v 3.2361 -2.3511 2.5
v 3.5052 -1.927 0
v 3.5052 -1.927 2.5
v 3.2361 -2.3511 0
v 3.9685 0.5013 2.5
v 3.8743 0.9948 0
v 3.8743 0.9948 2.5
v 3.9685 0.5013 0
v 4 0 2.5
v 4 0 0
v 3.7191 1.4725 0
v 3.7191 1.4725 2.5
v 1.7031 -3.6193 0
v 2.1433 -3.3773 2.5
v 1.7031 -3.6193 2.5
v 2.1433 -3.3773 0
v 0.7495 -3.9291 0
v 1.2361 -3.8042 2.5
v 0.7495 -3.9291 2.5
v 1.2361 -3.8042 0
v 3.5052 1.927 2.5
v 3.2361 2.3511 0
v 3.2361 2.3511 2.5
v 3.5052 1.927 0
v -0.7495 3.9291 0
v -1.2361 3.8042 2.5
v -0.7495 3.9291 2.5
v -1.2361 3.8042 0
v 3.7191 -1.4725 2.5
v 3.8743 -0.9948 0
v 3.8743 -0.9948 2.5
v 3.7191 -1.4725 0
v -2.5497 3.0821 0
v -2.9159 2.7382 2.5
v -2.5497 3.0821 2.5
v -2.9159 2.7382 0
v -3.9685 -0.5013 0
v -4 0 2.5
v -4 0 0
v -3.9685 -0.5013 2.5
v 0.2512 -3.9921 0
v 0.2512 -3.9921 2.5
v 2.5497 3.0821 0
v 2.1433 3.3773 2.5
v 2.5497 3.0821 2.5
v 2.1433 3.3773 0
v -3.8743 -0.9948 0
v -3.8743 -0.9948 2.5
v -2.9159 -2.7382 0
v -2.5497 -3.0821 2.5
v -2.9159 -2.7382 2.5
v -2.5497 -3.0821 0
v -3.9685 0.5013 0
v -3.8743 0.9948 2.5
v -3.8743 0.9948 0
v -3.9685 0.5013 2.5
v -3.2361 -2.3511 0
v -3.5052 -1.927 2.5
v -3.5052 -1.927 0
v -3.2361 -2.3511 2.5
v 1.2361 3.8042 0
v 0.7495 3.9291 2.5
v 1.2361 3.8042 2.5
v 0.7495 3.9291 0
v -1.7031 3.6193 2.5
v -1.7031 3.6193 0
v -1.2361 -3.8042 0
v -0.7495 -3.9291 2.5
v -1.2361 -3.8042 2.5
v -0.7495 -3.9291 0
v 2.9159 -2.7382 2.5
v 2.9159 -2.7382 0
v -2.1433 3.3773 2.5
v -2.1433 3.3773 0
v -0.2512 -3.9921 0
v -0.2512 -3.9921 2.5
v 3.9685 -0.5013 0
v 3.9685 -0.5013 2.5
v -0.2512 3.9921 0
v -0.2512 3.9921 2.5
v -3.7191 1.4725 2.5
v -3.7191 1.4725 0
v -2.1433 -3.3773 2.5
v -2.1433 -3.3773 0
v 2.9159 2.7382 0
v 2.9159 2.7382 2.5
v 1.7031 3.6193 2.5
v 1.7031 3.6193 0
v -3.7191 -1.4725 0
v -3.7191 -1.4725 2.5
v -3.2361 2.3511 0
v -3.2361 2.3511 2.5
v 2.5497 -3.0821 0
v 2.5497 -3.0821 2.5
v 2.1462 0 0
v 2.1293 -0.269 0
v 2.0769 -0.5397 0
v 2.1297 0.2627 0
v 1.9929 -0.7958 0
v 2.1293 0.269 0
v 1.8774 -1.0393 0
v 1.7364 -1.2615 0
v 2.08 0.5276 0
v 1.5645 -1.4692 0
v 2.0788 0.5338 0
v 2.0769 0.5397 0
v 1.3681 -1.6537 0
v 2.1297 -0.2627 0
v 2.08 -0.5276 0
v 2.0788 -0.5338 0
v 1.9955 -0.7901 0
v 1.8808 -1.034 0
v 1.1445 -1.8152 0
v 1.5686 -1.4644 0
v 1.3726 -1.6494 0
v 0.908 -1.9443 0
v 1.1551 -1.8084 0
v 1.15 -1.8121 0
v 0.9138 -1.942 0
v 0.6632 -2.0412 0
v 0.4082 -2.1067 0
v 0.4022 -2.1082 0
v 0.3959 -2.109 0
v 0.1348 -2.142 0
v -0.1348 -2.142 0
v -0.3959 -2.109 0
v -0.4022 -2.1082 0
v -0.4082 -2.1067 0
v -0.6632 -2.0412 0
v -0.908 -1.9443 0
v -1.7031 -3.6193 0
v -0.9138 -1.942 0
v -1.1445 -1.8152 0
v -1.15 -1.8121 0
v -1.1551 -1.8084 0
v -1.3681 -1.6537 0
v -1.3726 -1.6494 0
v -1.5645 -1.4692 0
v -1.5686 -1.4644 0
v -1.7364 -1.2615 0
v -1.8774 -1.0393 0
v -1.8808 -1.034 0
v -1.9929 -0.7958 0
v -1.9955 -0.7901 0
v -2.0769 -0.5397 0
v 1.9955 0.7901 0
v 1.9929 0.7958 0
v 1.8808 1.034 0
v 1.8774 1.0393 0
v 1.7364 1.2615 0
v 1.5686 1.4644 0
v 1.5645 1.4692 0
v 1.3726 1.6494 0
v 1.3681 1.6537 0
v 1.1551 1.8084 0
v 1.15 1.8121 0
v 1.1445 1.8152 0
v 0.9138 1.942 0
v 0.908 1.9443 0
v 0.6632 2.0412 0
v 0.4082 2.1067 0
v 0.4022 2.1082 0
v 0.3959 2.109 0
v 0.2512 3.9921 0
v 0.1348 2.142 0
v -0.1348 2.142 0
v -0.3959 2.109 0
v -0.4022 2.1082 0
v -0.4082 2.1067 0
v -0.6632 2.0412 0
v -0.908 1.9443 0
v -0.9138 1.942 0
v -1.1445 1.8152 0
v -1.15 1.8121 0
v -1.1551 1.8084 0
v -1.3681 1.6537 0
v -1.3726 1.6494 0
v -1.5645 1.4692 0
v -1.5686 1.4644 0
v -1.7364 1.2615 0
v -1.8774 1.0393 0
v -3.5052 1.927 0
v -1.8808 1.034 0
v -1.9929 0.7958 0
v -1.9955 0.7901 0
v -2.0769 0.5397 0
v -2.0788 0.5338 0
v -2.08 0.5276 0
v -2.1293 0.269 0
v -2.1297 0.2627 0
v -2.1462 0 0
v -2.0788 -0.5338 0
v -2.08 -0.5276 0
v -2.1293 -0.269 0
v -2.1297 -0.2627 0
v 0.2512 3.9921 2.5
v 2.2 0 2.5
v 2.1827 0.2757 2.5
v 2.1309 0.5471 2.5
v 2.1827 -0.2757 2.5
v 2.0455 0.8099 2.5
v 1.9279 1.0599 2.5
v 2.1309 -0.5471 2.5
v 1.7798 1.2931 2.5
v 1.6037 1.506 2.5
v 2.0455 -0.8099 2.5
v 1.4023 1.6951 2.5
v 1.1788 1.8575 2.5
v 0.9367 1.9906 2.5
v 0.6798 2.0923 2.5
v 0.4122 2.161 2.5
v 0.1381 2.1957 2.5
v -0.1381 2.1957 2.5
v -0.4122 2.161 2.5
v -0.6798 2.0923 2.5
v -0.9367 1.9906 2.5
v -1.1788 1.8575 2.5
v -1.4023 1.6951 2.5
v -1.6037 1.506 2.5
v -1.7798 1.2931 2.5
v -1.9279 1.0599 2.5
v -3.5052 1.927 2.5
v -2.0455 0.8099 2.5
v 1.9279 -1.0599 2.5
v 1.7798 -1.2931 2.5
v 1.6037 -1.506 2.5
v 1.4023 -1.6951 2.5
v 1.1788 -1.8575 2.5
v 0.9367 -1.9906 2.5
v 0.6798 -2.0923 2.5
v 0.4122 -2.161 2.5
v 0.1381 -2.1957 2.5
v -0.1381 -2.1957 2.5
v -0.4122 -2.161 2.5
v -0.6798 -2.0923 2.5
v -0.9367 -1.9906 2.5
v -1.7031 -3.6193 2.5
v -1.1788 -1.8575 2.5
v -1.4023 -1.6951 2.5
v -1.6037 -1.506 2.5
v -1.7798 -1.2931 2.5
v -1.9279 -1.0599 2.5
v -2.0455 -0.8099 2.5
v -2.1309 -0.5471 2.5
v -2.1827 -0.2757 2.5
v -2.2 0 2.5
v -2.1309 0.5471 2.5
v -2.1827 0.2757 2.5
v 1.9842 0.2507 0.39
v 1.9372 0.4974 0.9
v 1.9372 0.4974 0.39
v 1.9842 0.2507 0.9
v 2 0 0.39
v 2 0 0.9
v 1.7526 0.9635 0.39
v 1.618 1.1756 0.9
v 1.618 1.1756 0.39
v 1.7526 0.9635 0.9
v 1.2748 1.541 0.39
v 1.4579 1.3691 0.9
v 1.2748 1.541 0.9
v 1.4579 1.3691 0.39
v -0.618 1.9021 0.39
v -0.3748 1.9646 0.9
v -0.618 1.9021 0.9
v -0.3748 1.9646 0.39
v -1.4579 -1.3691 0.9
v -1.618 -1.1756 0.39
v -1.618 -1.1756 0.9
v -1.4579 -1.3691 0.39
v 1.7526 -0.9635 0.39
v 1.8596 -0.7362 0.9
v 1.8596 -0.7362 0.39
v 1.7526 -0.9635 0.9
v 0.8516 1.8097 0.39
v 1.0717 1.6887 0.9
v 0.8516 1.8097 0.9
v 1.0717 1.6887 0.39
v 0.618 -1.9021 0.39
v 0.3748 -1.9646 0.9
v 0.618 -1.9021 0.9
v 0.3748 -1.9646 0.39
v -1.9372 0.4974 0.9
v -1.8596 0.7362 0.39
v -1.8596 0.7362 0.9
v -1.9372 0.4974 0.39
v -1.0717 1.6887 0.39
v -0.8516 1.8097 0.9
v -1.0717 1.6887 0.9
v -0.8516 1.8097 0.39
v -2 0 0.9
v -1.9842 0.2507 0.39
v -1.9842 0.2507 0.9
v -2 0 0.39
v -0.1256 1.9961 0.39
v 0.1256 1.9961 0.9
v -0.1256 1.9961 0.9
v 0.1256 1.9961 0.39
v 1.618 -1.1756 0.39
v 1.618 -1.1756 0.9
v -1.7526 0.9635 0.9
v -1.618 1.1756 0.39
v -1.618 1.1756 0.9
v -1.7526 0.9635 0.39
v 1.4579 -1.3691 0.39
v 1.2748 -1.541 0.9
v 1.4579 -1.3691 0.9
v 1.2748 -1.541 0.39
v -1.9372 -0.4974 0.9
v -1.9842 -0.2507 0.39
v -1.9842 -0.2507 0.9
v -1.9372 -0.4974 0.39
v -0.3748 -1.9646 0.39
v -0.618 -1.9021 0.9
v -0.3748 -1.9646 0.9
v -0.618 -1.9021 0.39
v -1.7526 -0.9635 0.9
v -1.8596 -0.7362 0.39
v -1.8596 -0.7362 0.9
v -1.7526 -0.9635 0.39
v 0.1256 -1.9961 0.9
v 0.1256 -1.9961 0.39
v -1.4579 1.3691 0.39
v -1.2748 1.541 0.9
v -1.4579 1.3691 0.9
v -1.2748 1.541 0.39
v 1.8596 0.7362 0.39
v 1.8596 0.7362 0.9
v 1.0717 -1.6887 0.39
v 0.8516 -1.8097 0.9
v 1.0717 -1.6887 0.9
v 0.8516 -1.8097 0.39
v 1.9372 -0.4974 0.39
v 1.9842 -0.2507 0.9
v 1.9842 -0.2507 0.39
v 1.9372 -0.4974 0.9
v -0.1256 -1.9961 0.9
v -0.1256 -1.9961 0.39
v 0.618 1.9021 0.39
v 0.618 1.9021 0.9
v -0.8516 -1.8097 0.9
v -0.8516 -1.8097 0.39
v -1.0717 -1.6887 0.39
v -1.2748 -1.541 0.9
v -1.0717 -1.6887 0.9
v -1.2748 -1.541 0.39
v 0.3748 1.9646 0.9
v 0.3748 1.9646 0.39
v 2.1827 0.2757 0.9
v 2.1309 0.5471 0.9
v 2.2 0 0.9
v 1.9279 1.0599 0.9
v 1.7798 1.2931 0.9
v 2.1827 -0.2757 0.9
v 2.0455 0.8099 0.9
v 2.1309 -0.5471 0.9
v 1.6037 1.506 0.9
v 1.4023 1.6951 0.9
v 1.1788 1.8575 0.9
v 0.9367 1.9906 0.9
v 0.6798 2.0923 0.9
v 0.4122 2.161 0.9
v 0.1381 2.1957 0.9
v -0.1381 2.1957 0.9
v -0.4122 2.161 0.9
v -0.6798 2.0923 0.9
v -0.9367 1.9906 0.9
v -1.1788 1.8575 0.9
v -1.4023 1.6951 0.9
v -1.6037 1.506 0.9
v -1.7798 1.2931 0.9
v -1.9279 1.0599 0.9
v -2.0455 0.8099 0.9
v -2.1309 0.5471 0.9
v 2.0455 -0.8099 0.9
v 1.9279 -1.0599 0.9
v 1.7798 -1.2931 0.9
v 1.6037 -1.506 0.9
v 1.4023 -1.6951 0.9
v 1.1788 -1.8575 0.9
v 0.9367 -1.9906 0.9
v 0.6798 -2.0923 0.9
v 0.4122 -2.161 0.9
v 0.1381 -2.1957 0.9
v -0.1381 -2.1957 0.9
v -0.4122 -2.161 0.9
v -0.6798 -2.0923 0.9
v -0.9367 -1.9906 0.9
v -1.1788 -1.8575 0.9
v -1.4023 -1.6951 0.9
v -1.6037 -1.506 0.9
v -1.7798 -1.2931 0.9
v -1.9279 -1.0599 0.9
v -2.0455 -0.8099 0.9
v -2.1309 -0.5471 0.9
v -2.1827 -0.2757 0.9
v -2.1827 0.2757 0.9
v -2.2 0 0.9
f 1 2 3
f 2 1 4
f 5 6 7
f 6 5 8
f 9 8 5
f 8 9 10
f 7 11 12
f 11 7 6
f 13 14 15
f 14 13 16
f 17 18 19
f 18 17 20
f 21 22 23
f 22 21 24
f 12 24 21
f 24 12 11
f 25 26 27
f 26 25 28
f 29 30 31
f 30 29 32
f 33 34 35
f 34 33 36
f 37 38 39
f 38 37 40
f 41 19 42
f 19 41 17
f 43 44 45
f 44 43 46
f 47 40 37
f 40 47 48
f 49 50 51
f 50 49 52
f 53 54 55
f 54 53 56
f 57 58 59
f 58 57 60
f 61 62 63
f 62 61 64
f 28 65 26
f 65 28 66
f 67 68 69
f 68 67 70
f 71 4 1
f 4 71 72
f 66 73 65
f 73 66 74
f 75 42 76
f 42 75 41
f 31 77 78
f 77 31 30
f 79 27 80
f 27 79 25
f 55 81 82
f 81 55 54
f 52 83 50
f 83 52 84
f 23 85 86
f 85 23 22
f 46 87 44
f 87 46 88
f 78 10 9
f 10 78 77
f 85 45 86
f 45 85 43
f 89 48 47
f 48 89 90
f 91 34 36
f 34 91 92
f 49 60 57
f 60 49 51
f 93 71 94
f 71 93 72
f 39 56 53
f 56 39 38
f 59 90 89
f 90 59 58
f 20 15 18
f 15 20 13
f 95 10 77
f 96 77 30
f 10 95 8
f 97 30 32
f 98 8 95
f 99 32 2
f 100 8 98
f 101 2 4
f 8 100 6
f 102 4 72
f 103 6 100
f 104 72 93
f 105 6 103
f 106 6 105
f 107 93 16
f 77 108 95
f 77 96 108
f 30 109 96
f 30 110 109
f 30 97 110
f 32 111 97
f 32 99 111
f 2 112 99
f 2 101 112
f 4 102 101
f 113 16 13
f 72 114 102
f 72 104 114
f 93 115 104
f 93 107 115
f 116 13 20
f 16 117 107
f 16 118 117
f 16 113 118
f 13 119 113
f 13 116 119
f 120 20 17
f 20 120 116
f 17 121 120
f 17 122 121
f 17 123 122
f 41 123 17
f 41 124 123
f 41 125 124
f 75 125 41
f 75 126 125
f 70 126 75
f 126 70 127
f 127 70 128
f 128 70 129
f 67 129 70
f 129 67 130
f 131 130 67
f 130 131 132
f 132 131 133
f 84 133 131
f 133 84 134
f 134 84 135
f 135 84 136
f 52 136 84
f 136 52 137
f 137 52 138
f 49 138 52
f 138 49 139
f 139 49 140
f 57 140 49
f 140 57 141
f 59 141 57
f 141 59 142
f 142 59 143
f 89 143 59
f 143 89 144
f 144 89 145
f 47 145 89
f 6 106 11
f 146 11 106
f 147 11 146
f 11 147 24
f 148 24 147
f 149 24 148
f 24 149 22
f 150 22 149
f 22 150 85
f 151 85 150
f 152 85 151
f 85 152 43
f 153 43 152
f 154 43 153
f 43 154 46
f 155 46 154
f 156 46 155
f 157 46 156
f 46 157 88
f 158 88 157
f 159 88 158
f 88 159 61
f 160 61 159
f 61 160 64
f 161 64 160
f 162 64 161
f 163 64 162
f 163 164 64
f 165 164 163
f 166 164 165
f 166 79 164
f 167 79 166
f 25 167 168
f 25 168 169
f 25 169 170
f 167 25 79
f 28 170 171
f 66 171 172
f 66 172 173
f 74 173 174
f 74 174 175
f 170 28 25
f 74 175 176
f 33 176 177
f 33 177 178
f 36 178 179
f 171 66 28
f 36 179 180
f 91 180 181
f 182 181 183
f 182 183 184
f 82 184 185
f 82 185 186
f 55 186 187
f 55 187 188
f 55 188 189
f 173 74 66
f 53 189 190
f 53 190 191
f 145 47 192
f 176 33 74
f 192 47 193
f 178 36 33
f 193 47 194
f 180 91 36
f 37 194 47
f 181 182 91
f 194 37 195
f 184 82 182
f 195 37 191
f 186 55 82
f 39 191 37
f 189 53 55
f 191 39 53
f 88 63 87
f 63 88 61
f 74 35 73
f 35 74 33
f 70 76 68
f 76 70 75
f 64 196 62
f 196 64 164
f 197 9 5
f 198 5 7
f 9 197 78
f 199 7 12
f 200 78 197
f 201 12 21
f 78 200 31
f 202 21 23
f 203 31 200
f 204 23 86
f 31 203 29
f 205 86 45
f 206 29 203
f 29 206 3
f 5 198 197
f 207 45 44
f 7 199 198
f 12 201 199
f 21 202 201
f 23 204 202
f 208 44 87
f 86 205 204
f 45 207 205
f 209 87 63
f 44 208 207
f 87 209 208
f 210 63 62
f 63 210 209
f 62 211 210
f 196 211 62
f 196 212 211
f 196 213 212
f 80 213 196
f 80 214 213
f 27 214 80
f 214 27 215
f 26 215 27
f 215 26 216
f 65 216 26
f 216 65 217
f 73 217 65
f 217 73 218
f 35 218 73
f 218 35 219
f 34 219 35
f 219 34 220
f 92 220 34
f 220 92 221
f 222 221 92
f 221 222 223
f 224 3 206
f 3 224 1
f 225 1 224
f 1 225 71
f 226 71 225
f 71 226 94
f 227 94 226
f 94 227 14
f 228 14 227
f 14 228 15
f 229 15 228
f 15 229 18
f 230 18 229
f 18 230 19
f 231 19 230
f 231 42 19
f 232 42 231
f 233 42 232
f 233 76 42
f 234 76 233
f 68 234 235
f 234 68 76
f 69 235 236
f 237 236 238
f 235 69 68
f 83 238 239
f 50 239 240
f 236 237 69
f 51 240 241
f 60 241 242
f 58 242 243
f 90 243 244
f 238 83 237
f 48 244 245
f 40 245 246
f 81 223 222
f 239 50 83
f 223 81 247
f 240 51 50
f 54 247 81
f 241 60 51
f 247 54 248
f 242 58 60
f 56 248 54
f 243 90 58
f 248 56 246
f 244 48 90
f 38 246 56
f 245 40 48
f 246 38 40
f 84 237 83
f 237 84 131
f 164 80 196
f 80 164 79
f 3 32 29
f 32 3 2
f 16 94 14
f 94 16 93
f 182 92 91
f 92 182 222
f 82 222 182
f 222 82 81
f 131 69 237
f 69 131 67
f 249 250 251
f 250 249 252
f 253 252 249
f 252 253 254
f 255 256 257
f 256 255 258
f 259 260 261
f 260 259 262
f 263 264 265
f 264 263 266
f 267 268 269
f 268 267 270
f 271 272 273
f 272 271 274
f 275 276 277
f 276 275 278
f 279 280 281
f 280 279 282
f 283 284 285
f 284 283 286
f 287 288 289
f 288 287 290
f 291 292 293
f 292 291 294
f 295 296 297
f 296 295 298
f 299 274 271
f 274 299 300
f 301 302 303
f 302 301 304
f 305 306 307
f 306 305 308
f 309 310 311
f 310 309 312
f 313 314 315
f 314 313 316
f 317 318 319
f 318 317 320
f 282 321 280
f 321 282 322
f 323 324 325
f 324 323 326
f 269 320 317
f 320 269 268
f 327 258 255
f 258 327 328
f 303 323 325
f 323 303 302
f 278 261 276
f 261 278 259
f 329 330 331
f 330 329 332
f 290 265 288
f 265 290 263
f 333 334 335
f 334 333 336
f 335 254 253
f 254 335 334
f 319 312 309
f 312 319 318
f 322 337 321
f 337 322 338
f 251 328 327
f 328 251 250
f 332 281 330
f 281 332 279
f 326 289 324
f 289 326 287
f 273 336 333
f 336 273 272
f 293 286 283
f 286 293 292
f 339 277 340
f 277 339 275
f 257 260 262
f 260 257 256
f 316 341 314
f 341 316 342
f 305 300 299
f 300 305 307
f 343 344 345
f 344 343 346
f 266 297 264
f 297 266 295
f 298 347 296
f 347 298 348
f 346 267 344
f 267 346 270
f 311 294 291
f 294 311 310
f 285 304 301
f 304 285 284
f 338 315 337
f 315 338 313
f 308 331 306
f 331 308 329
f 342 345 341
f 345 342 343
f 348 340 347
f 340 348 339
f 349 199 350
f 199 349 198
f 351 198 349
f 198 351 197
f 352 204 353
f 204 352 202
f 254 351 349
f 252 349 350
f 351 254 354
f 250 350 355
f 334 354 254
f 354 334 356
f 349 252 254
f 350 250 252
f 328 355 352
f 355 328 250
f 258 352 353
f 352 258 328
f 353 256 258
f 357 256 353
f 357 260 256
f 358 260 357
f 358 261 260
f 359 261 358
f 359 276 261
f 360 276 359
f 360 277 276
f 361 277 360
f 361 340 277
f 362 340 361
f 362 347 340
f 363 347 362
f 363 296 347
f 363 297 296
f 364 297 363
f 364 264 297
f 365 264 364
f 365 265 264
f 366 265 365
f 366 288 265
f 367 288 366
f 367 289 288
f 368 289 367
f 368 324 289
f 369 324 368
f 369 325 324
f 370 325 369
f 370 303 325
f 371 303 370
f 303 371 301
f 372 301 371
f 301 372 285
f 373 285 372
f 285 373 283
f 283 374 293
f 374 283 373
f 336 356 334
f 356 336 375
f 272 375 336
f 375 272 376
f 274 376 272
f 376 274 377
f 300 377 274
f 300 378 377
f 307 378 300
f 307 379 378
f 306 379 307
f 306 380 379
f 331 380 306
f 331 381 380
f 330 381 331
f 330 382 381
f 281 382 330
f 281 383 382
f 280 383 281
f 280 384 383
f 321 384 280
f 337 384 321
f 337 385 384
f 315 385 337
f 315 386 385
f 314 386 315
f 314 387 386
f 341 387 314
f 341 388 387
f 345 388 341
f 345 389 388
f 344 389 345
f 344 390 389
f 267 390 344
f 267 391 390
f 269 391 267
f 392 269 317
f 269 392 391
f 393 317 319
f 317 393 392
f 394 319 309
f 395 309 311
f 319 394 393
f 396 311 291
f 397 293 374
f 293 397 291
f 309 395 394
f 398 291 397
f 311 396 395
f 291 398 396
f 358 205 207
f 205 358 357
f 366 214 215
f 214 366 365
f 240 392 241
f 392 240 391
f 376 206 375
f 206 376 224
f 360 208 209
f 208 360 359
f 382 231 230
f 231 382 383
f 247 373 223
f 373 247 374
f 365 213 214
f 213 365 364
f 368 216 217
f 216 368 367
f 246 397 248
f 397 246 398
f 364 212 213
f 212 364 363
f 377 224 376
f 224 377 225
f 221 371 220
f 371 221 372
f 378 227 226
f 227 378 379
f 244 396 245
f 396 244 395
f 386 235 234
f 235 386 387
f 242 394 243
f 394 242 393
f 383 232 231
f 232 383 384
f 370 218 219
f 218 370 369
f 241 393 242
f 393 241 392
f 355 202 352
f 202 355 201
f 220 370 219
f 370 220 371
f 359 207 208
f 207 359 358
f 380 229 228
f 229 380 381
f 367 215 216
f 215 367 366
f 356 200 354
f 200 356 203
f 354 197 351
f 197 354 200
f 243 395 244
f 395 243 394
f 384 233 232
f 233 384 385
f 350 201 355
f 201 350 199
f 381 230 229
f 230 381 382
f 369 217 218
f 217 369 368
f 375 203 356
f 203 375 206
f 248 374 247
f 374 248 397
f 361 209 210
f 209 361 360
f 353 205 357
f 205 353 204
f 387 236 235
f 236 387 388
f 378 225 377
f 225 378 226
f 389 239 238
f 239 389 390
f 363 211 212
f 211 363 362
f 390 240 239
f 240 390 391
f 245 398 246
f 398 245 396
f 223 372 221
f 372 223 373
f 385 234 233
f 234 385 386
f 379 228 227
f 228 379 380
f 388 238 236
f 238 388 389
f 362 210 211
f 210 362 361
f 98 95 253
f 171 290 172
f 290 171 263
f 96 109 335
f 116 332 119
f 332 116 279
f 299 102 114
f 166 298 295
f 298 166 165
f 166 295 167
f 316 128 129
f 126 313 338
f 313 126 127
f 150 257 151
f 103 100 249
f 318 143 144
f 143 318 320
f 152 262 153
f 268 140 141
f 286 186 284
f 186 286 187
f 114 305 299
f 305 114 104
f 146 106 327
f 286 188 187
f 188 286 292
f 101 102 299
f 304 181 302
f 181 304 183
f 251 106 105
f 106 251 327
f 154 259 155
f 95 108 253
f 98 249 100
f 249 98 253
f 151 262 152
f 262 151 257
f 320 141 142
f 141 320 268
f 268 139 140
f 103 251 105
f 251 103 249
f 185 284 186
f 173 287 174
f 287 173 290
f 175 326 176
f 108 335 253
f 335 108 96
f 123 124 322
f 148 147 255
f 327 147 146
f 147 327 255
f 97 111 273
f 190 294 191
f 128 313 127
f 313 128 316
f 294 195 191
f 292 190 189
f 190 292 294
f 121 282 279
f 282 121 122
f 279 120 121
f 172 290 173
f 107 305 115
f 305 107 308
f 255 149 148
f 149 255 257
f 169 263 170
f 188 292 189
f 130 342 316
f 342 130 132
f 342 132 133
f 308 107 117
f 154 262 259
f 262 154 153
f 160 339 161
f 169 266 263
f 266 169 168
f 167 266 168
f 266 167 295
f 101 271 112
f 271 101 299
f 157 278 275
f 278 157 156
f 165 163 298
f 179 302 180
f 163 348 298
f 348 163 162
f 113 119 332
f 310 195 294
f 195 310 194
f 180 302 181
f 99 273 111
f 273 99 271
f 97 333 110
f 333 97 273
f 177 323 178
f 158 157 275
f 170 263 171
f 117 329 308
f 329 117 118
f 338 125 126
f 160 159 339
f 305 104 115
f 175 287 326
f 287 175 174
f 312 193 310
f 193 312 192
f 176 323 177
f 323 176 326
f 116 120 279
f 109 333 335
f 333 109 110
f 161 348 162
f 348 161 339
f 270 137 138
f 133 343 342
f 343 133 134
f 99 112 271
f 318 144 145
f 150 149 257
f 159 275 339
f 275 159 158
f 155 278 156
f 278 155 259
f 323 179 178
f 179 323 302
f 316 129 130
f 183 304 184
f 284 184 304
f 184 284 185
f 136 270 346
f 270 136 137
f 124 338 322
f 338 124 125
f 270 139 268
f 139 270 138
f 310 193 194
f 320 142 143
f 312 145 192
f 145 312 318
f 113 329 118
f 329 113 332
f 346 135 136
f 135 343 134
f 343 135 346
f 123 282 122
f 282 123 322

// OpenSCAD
// ====================================================================
// [PRINT 08-D] Standalone Precision Retaining End Cap (Compact Flush Fit)
//
// Engineering Specifications:
// - Outer Disk: 8.0mm diameter x 2.5mm thickness
// - Inner Entry Neck: 4.0mm narrow bore (compresses 4.2mm barb tip on insertion)
// - Internal Snap Shoulder: 4.4mm internal recess (locks 4.2mm barb tip securely)
// - Flush Mounting: Outer face sits tight against Ear 2 outer face with zero axial gap!
// ====================================================================

$fn = 50;

pin_shaft_d  = 3.8;   // 3.8mm rod diameter
head_d       = 8.0;   // Outer cap head disk diameter
cap_th       = 2.5;   // Cap disk thickness
socket_d     = 4.0;   // Narrow entry neck bore (4.0mm)
shoulder_d   = 4.4;   // Internal snap-shoulder recess (4.4mm)

module precision_retaining_end_cap() {
    difference() {
        union() {
            // Flat outer cap disk resting flat at Z = 0
            cylinder(d = head_d, h = cap_th);
        }

        // 1. Narrow inner entry neck bore (4.0mm diameter x 1.0mm depth)
        translate([0, 0, -0.5])
            cylinder(d = socket_d, h = 1.5);

        // 2. Internal snap-shoulder recess (4.4mm diameter catches 4.2mm barb tip)
        translate([0, 0, 0.9])
            cylinder(d = shoulder_d, h = 1.6);

        // 3. Small self-guiding chamfer at entry face (4.3mm -> 4.0mm over 0.4mm depth)
        translate([0, 0, -0.01])
            cylinder(d1 = socket_d + 0.3, d2 = socket_d, h = 0.4);
    }
}

module retaining_end_cap() {
    precision_retaining_end_cap();
}

precision_retaining_end_cap();
